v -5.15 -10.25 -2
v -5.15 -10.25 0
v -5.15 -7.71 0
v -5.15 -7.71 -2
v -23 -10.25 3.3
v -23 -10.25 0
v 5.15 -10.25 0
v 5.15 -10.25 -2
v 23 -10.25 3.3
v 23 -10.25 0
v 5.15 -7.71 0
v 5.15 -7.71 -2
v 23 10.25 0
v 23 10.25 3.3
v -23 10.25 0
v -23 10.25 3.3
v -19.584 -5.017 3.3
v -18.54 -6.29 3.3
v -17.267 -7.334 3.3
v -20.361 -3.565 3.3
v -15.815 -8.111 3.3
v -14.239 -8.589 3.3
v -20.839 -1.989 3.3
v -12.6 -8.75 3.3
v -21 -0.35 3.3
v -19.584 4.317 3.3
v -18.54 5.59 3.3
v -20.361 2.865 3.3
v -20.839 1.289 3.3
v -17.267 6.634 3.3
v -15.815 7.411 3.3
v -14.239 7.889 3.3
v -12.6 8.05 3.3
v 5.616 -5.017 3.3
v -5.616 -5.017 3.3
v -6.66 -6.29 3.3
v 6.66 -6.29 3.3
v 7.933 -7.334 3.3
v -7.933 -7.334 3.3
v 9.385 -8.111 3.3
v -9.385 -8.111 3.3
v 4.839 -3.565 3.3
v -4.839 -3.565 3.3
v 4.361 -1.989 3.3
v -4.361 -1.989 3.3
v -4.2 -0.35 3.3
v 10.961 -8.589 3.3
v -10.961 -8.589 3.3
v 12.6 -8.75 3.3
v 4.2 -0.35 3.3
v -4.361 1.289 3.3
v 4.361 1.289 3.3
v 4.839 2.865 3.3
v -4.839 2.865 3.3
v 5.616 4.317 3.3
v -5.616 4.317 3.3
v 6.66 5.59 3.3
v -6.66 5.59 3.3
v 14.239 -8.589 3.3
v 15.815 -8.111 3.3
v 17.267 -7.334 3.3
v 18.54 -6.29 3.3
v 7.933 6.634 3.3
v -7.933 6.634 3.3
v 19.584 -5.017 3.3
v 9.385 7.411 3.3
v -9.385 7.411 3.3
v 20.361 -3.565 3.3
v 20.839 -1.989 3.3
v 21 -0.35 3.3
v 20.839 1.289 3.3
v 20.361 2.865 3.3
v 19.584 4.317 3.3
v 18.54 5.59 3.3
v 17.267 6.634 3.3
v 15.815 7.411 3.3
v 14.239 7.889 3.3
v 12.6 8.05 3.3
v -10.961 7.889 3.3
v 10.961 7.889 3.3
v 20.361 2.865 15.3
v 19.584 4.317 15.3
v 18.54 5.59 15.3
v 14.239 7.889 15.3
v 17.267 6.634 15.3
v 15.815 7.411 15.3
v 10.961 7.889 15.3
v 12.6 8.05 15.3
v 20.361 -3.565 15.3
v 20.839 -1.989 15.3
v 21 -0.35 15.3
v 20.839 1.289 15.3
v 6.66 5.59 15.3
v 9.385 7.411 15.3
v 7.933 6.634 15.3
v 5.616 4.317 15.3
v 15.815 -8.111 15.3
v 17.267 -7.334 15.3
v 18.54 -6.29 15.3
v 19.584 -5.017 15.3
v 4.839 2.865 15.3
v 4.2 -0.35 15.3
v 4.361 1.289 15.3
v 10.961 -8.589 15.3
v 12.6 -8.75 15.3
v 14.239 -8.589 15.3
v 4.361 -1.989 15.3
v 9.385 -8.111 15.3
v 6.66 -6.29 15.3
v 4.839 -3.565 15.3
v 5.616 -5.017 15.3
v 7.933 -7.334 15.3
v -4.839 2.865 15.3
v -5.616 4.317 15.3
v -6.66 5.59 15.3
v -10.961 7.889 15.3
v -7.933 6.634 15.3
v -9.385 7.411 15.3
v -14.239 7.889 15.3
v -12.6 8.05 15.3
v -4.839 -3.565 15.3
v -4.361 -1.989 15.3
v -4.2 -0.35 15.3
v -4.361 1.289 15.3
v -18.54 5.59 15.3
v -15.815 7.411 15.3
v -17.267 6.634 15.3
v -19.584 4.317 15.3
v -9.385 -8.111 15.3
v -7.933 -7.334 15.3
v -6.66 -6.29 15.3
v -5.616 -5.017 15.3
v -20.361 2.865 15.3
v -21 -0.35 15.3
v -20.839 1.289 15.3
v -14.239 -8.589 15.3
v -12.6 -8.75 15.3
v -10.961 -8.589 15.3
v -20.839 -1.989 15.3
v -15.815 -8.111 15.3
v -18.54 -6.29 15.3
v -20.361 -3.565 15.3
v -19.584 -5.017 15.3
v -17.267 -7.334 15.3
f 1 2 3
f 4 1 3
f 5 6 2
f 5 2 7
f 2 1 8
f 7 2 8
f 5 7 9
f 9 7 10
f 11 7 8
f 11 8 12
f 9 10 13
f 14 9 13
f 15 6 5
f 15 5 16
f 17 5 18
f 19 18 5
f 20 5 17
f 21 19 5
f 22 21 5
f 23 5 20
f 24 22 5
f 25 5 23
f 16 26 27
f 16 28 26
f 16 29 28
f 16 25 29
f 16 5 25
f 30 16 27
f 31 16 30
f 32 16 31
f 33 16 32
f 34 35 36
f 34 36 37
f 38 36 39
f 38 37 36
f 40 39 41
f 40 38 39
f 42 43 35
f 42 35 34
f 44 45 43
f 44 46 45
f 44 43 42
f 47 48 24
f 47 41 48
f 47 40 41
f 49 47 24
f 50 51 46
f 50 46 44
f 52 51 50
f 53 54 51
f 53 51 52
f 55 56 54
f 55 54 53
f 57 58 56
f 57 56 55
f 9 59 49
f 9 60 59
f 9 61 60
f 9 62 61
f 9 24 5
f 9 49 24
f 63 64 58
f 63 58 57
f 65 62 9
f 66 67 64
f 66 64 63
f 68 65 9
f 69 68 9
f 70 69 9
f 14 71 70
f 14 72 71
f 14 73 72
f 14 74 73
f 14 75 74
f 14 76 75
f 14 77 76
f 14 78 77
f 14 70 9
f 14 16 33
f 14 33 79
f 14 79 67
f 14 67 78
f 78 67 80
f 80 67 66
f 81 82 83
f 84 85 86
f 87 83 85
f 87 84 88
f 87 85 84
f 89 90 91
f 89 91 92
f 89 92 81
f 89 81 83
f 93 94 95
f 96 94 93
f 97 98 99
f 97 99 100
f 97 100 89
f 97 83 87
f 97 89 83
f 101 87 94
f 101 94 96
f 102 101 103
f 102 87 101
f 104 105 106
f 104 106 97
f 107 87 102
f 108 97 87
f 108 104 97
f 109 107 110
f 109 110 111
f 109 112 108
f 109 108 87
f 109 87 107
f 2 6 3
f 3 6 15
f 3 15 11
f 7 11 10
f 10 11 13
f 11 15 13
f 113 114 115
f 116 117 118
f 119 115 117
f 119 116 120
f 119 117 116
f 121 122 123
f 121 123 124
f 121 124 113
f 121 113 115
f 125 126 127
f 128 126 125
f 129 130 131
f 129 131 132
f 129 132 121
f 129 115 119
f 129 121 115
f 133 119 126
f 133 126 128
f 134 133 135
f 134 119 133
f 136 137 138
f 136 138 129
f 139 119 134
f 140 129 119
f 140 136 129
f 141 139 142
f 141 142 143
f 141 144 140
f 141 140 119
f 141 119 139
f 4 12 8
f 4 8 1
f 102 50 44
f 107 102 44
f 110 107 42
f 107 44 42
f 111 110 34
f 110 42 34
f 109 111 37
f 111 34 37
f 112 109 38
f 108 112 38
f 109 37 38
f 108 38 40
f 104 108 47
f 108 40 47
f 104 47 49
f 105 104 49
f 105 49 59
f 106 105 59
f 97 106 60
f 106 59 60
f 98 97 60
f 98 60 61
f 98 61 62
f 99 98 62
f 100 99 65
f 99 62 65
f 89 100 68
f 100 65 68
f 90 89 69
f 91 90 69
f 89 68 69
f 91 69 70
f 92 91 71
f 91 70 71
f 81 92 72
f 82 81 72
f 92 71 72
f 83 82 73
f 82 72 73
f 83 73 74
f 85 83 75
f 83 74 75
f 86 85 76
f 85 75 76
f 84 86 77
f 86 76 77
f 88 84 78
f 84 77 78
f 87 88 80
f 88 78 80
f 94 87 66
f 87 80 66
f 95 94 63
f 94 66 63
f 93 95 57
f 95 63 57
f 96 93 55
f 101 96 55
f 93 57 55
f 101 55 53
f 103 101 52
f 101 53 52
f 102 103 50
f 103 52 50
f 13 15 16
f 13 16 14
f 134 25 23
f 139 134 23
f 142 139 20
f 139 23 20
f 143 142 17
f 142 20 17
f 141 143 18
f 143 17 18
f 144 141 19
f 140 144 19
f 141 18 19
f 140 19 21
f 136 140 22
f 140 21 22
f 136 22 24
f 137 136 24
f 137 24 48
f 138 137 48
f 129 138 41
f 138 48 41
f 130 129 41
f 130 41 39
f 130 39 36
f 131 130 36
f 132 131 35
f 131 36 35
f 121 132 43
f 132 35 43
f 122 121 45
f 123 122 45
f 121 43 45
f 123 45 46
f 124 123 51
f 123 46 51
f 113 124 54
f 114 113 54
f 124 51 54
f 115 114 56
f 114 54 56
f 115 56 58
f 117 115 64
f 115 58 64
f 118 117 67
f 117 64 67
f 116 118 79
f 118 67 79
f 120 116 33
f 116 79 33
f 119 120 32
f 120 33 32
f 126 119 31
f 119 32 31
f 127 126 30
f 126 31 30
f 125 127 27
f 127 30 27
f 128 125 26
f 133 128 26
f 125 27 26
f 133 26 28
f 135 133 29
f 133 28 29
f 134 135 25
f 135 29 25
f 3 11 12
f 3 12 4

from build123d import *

# Parameters (mm, degrees)
SKETCH1_W           = 46
SKETCH1_H           = 20.5
BOSS_EXTRUDE1_DEPTH = 3.3
SKETCH2_R           = 8.4
BOSS_EXTRUDE2_DEPTH = 12
SKETCH3_W           = 10.3
SKETCH3_H           = 2.54
BOSS_EXTRUDE3_DEPTH = 2


with BuildPart() as part:
    # Sketch1 → Boss-Extrude1 (new body)
    with BuildSketch(Plane.XY):
        Rectangle(SKETCH1_W, SKETCH1_H)
    extrude(amount=BOSS_EXTRUDE1_DEPTH)

    # Sketch2 → Boss-Extrude2 (add)
    with BuildSketch(Plane.XY.offset(3.3)):
        with Locations(Location((-12.6, -0.35, 0), (0, 0, 180))):
            Circle(SKETCH2_R)
        with Locations(Location((12.6, -0.35, 0), (0, 0, 180))):
            Circle(SKETCH2_R)
    extrude(amount=BOSS_EXTRUDE2_DEPTH)

    # Sketch3 → Boss-Extrude3 (add)
    with BuildSketch(Plane(origin=(0, 0, 0), x_dir=(-1, 0, 0), z_dir=(0, 0, -1))):
        with Locations((0, -8.98)):
            Rectangle(SKETCH3_W, SKETCH3_H)
    extrude(amount=BOSS_EXTRUDE3_DEPTH)


solid = part.part
